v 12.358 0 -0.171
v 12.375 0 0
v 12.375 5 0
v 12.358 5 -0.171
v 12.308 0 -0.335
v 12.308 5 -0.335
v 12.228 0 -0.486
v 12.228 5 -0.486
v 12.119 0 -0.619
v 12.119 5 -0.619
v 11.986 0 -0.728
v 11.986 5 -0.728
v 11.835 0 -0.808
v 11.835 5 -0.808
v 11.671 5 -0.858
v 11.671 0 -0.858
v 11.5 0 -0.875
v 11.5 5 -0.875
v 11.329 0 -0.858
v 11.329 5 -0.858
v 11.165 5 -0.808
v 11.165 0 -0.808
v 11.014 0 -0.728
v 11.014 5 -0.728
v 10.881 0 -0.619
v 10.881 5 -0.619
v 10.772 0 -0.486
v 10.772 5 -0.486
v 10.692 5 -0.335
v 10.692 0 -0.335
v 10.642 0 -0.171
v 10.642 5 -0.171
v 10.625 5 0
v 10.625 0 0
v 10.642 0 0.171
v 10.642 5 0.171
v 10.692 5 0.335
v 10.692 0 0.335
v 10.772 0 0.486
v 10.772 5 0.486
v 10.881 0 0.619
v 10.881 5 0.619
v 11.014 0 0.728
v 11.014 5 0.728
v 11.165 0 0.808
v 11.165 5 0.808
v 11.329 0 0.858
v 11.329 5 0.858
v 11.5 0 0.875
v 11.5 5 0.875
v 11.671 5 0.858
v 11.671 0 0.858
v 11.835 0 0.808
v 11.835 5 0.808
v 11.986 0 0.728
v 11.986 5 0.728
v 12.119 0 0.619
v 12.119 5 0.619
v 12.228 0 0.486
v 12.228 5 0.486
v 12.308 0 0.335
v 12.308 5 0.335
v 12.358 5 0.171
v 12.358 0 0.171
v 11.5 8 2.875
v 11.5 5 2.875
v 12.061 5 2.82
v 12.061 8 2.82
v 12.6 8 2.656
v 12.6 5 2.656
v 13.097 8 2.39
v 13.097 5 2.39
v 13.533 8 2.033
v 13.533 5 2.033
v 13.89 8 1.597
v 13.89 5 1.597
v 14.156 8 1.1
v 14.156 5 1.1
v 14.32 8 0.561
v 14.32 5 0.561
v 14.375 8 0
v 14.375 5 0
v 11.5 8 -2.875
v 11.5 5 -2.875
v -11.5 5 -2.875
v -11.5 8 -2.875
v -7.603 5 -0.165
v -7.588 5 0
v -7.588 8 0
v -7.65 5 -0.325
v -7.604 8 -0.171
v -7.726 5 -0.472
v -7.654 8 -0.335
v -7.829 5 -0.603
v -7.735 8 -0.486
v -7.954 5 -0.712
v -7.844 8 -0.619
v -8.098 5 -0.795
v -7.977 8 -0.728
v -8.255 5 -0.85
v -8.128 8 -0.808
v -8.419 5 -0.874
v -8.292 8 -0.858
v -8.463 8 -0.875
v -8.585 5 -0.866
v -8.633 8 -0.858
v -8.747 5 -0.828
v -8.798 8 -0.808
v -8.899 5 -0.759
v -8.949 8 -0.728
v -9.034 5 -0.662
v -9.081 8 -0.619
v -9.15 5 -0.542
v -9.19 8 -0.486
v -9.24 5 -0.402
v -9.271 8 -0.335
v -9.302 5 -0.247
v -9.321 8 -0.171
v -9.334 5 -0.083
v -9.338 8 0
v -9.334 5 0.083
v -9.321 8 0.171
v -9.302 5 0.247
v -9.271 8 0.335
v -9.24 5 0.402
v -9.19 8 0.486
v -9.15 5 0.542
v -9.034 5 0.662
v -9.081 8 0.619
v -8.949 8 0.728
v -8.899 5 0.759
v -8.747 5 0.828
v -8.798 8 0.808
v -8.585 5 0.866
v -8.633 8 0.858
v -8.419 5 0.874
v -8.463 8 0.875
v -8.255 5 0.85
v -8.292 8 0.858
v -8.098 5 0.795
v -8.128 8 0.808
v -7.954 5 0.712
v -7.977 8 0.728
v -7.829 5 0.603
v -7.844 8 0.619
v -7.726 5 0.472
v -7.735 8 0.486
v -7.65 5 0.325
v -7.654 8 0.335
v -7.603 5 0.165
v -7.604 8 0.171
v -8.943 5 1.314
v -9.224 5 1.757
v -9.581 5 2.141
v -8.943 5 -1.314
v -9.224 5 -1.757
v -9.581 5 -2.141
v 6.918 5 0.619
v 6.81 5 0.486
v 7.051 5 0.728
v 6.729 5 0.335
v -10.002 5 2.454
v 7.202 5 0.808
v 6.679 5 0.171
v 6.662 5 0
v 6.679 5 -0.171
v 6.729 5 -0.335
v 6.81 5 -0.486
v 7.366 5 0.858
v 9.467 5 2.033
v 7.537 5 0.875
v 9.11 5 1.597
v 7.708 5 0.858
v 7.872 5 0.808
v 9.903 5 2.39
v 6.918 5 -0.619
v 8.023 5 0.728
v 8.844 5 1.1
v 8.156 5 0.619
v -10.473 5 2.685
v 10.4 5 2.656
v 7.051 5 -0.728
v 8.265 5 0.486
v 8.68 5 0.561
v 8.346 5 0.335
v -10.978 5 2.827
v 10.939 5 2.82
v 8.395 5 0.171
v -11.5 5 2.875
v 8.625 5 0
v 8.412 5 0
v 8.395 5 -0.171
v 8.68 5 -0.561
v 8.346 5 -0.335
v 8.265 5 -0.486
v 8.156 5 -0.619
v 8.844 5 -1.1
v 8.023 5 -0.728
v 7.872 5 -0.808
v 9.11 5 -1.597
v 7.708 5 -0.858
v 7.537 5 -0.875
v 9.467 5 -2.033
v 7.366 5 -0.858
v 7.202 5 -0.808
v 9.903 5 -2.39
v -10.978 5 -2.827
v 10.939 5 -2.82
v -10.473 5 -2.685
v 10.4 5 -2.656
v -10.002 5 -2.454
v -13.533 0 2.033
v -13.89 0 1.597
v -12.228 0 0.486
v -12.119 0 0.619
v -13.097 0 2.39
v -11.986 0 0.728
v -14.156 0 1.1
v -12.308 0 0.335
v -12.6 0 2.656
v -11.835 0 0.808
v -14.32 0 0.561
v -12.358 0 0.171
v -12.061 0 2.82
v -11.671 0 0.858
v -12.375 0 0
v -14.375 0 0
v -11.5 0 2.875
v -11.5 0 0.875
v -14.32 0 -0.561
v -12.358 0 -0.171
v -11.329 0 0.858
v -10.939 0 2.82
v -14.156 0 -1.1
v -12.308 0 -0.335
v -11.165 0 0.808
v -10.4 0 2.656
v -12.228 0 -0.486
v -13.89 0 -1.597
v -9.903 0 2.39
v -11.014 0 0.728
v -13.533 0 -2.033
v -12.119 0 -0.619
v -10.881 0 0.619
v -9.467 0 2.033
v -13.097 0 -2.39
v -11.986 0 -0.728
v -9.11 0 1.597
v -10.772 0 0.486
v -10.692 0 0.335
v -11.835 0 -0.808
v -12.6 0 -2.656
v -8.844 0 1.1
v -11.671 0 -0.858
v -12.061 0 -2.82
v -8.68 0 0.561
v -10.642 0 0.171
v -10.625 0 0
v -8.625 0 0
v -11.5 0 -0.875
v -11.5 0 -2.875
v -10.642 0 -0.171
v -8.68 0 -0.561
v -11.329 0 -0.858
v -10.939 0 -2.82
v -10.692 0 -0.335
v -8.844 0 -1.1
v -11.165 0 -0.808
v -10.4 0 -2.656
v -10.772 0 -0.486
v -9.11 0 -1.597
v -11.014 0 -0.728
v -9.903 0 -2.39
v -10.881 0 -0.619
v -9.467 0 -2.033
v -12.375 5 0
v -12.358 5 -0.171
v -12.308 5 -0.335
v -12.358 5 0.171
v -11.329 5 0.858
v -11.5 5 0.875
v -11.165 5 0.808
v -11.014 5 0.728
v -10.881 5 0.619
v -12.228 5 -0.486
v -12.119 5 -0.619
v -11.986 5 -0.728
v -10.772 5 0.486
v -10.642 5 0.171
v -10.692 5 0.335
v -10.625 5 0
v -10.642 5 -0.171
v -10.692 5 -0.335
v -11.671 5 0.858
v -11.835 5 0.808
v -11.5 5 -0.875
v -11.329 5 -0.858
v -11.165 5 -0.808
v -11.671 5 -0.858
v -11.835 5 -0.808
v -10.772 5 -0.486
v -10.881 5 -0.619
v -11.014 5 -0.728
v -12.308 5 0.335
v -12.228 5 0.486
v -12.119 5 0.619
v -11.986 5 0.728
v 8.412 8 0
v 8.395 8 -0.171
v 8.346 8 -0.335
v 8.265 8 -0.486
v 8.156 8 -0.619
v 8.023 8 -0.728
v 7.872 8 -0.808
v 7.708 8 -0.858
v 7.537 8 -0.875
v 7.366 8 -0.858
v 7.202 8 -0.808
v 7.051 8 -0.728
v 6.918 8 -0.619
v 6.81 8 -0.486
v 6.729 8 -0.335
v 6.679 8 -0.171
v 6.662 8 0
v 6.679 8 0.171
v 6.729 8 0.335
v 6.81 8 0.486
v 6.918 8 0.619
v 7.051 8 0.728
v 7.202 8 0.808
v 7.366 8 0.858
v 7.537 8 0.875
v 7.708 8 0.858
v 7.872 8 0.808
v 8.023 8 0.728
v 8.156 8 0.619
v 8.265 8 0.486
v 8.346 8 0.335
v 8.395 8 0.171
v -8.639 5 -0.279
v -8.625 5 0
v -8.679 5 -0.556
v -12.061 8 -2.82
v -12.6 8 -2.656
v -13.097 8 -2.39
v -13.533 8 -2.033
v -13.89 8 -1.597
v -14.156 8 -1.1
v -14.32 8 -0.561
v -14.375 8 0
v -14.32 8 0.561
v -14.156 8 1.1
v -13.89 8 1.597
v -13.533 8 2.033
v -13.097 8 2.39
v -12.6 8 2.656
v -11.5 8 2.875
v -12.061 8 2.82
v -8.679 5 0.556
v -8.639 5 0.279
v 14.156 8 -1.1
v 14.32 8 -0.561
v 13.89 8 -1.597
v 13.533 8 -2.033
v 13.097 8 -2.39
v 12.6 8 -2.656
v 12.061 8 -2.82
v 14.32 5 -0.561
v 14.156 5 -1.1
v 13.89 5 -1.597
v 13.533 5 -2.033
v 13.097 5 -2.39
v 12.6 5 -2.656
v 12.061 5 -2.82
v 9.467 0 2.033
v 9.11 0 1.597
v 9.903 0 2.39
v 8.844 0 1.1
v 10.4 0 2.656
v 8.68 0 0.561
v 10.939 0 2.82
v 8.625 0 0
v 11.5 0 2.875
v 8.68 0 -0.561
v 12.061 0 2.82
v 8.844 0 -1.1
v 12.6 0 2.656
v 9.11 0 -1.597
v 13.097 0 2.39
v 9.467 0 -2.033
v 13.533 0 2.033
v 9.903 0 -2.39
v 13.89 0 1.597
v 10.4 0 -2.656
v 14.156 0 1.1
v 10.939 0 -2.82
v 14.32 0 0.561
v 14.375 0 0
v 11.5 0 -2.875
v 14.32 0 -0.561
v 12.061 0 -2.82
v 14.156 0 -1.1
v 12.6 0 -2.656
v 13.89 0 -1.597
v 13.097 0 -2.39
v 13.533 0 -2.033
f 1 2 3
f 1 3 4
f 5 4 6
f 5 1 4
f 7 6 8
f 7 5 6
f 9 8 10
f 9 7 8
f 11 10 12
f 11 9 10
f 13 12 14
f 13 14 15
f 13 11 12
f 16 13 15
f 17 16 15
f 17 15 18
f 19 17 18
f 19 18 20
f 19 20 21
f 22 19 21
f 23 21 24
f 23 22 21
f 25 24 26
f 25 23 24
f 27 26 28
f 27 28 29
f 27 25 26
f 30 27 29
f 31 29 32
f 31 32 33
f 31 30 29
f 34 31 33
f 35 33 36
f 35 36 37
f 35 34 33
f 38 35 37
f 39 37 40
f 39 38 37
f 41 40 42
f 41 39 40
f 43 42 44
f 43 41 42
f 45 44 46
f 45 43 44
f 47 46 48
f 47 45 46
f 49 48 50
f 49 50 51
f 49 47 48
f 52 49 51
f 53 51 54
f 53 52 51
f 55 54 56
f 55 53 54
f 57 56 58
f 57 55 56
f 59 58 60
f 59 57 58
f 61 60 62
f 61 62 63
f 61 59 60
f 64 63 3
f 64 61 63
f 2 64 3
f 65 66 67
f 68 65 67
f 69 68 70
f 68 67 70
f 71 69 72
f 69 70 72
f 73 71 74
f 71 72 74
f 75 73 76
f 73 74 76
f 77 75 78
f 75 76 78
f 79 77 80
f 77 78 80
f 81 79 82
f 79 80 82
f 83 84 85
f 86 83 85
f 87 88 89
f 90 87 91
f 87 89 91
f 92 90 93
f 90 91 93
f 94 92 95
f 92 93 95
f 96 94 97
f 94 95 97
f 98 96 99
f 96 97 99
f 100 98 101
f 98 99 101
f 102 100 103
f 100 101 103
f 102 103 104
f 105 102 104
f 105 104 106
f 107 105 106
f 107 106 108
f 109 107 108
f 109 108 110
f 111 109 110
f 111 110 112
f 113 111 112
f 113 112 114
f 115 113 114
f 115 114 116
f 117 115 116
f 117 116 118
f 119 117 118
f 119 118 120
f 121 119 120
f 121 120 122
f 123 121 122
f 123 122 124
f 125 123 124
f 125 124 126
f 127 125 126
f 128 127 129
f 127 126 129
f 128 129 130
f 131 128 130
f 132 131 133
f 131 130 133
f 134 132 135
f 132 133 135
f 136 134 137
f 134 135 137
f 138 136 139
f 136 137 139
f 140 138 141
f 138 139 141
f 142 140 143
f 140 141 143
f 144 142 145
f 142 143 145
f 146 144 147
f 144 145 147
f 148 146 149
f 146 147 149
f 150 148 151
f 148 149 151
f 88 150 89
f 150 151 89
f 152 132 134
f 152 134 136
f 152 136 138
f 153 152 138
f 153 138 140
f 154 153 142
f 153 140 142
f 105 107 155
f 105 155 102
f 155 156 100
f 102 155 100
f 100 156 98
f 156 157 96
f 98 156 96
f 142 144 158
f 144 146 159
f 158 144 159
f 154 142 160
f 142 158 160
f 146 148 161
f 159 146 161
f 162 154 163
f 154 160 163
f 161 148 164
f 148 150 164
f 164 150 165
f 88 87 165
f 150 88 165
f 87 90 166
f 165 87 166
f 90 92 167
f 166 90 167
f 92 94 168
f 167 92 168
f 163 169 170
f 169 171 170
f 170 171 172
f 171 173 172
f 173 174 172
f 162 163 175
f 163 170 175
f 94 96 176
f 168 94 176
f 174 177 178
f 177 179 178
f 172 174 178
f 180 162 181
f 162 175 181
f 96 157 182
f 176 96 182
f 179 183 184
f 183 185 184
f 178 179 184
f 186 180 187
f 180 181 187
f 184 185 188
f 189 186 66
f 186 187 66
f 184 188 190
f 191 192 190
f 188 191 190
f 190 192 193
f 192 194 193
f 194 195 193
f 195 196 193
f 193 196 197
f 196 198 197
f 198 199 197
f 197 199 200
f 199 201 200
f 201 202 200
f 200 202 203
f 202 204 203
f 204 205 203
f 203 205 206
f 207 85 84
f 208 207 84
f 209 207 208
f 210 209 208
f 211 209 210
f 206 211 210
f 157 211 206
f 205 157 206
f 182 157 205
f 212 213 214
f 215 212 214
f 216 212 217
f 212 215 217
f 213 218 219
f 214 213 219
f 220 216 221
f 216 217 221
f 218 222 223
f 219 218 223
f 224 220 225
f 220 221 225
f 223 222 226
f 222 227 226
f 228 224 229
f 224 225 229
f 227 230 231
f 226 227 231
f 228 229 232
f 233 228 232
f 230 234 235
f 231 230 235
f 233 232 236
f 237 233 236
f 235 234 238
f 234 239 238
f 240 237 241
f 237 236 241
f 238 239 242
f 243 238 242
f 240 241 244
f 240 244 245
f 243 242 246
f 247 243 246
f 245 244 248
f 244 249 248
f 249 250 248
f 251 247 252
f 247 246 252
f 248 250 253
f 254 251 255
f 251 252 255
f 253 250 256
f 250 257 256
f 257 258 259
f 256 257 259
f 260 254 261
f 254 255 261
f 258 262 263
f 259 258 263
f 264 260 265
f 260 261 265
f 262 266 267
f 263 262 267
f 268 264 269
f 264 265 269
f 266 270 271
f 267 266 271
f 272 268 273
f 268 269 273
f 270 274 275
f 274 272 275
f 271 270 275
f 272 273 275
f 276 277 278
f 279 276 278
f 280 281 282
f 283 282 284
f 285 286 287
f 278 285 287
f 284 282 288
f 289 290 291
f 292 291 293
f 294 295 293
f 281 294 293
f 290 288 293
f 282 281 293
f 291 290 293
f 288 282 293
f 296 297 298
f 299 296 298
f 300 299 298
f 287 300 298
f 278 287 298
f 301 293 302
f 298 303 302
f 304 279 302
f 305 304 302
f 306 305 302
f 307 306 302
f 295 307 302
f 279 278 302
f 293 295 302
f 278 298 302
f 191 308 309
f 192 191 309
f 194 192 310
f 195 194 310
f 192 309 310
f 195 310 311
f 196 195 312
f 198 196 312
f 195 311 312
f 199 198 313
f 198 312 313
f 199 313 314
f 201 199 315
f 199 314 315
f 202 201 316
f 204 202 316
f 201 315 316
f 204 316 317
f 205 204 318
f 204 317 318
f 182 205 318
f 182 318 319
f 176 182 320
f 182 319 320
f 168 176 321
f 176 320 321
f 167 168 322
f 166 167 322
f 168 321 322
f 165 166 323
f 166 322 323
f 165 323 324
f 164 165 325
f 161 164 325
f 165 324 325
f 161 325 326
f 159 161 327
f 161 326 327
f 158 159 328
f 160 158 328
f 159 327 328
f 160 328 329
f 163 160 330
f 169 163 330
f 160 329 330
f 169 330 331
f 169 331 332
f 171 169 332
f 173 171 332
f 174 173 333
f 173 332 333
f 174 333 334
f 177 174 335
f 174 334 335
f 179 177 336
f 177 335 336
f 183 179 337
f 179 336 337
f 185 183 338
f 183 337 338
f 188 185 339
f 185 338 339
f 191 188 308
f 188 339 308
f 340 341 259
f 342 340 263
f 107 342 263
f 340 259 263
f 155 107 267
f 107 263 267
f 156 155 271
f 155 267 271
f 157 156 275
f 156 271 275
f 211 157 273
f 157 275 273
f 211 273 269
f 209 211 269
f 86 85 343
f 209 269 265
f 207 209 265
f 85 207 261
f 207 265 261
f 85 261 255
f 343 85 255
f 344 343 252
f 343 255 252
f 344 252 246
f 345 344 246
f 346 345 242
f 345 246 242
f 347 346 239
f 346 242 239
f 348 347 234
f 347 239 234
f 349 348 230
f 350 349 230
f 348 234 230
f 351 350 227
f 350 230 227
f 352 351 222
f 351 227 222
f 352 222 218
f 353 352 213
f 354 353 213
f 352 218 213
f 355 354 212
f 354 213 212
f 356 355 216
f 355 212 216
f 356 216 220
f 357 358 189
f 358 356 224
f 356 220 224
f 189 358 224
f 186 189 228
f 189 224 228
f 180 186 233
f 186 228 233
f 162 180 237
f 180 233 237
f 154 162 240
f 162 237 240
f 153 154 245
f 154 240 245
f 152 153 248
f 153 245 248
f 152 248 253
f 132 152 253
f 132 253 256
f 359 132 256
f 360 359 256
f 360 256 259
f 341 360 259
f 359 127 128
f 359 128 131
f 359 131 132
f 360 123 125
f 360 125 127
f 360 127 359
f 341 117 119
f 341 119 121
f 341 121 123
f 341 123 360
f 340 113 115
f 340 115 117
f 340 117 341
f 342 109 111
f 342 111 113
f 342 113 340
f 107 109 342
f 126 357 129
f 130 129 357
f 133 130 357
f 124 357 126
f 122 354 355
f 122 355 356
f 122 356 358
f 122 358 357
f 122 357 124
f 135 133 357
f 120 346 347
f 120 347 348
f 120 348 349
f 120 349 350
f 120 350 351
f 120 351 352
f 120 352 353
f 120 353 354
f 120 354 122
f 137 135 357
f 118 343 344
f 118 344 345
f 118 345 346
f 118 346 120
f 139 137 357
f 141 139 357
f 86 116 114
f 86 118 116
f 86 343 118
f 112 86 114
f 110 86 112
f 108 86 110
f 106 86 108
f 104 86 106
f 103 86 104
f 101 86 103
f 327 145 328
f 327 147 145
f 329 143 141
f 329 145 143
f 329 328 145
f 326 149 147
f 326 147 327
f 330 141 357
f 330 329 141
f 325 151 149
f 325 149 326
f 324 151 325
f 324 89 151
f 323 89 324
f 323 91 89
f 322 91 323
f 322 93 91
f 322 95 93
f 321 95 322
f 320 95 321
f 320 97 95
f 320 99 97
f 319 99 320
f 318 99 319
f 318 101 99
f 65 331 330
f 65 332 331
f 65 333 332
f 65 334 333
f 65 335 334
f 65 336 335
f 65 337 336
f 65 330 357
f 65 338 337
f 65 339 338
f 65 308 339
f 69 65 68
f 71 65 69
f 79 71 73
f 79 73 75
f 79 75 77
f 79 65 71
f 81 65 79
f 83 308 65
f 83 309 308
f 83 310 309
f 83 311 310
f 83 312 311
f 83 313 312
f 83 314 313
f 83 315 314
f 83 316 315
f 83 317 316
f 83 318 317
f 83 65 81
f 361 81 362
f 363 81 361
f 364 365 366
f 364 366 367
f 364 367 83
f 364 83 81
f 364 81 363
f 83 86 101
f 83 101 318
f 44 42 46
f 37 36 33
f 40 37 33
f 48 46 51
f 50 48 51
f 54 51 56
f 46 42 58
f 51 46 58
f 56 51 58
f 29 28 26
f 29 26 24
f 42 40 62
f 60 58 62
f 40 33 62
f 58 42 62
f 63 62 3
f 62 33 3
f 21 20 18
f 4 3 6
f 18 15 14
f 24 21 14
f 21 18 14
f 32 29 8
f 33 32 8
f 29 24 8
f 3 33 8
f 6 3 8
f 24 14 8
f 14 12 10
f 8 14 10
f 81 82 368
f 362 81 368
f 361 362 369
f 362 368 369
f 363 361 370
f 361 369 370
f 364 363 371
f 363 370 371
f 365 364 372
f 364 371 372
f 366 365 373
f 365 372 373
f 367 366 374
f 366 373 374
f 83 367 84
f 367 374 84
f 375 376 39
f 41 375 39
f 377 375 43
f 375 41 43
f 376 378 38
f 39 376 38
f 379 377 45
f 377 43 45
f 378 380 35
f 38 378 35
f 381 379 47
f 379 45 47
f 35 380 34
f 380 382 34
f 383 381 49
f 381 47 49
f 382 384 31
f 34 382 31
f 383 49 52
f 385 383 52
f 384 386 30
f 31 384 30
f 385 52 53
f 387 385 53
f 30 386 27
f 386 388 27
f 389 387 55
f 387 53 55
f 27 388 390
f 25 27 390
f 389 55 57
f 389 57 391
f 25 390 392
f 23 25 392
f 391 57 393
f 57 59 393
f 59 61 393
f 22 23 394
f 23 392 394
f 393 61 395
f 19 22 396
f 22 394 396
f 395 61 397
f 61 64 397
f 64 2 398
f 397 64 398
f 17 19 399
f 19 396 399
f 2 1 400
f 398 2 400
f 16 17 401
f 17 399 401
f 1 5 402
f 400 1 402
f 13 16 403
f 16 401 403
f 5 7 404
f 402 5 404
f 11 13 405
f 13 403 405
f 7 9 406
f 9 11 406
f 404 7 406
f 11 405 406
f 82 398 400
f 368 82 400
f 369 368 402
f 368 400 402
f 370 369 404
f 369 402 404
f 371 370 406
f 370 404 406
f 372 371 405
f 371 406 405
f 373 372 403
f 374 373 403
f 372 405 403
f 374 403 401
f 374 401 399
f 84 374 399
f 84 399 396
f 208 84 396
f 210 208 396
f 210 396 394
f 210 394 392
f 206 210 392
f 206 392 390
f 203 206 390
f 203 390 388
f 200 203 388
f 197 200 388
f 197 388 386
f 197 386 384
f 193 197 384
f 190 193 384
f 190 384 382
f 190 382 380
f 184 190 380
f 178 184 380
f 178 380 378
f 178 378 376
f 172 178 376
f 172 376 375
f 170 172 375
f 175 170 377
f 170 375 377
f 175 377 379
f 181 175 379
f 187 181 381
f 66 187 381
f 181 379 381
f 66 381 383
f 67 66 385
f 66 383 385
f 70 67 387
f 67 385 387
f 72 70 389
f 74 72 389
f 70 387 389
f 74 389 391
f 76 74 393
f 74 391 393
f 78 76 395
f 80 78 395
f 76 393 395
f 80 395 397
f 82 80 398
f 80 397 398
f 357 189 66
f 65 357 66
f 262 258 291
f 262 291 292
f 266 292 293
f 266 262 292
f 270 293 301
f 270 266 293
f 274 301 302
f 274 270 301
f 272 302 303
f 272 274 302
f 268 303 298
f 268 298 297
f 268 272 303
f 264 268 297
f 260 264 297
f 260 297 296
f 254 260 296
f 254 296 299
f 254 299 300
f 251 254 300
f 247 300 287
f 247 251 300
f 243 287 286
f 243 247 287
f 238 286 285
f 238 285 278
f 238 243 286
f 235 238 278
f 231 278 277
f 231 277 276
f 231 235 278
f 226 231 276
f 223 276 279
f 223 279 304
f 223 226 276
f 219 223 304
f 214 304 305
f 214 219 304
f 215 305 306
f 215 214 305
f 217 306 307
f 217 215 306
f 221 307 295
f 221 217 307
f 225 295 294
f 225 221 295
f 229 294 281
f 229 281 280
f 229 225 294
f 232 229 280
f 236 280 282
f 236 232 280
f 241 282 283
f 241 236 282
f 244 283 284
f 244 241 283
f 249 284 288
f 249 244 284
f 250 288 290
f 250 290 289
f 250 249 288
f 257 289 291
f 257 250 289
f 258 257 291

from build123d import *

# Parameters (mm, degrees)
SKETCH1_R             = 2.875
SKETCH1_R_2           = 0.875
BOSS_EXTRUDE1_DEPTH   = 5
BOSS_EXTRUDE1_2_DEPTH = 5
BOSS_EXTRUDE2_DEPTH   = 3
SKETCH3_R             = 0.875
CUT_EXTRUDE1_DEPTH    = 3


with BuildPart() as part:
    # Sketch1 → Boss-Extrude1 (new body)
    with BuildSketch(Plane(origin=(0, 0, 0), x_dir=(1, 0, 0), z_dir=(0, 1, 0))):
        with Locations((-11.5, 0)):
            Circle(SKETCH1_R)
        with Locations((-11.5, 0)):
            Circle(SKETCH1_R_2, mode=Mode.SUBTRACT)
    extrude(amount=BOSS_EXTRUDE1_DEPTH)



with BuildPart() as body_2:
    # Sketch1 → Boss-Extrude1 2 (new body)
    with BuildSketch(Plane(origin=(0, 0, 0), x_dir=(1, 0, 0), z_dir=(0, 1, 0))):
        with Locations((11.5, 0)):
            Circle(SKETCH1_R)
        with Locations((11.5, 0)):
            Circle(SKETCH1_R_2, mode=Mode.SUBTRACT)
    extrude(amount=BOSS_EXTRUDE1_2_DEPTH)


with BuildPart() as part_1:
    add(part.part)

    add(body_2.part)  # Boss-Extrude2 merges body 2
    # Sketch2 → Boss-Extrude2 (add)
    with BuildSketch(Plane(origin=(0, 5, 0), x_dir=(1, 0, 0), z_dir=(0, 1, 0))):
        with BuildLine():
            ThreePointArc((-10.625, 0), (-10.881281566, 0.618718434), (-11.5, 0.875))
            Line((-11.5, 0.875), (-11.5, -0.875))
            ThreePointArc((-11.5, -0.875), (-10.881281566, -0.618718434), (-10.625, 0))
        make_face()
        with BuildLine():
            Line((-11.5, -0.875), (-11.5, 0.875))
            ThreePointArc((-11.5, 0.875), (-12.375, 0), (-11.5, -0.875))
        make_face()
        with BuildLine():
            ThreePointArc((-8.625, 0), (-9.467068004, 2.032931996), (-11.5, 2.875))
            Line((-11.5, 2.875), (-11.5, 0.875))
            ThreePointArc((-11.5, 0.875), (-10.881281566, 0.618718434), (-10.625, 0))
            ThreePointArc((-10.625, 0), (-10.881281566, -0.618718434), (-11.5, -0.875))
            Line((-11.5, -0.875), (-11.5, -2.875))
            ThreePointArc((-11.5, -2.875), (-9.467068004, -2.032931996), (-8.625, 0))
        make_face()
        with BuildLine():
            Line((-11.5, 0.875), (-11.5, 2.875))
            ThreePointArc((-11.5, 2.875), (-14.375, 0), (-11.5, -2.875))
            Line((-11.5, -2.875), (-11.5, -0.875))
            ThreePointArc((-11.5, -0.875), (-12.375, 0), (-11.5, 0.875))
        make_face()
        with BuildLine():
            Line((11.5, 2.875), (-11.5, 2.875))
            ThreePointArc((-11.5, 2.875), (-9.467068004, 2.032931996), (-8.625, 0))
            ThreePointArc((-8.625, 0), (-9.467068004, -2.032931996), (-11.5, -2.875))
            Line((-11.5, -2.875), (11.5, -2.875))
            ThreePointArc((11.5, -2.875), (8.625, 0), (11.5, 2.875))
        make_face()
        with BuildLine():
            ThreePointArc((14.375, 0), (13.532931996, 2.032931996), (11.5, 2.875))
            Line((11.5, 2.875), (11.5, -2.875))
            ThreePointArc((11.5, -2.875), (13.532931996, -2.032931996), (14.375, 0))
        make_face()
        with BuildLine():
            Line((11.5, -2.875), (11.5, 2.875))
            ThreePointArc((11.5, 2.875), (8.625, 0), (11.5, -2.875))
        make_face()
    extrude(amount=BOSS_EXTRUDE2_DEPTH)

    # Sketch3 → Cut-Extrude1 (cut)
    with BuildSketch(Plane(origin=(0, 8, 0), x_dir=(1, 0, 0), z_dir=(0, 1, 0))):
        with Locations((-8.4626864, 0)):
            Circle(SKETCH3_R)
        with Locations((7.537175494, 0)):
            Circle(SKETCH3_R)
    extrude(amount=-CUT_EXTRUDE1_DEPTH, mode=Mode.SUBTRACT)


solid = part_1.part
